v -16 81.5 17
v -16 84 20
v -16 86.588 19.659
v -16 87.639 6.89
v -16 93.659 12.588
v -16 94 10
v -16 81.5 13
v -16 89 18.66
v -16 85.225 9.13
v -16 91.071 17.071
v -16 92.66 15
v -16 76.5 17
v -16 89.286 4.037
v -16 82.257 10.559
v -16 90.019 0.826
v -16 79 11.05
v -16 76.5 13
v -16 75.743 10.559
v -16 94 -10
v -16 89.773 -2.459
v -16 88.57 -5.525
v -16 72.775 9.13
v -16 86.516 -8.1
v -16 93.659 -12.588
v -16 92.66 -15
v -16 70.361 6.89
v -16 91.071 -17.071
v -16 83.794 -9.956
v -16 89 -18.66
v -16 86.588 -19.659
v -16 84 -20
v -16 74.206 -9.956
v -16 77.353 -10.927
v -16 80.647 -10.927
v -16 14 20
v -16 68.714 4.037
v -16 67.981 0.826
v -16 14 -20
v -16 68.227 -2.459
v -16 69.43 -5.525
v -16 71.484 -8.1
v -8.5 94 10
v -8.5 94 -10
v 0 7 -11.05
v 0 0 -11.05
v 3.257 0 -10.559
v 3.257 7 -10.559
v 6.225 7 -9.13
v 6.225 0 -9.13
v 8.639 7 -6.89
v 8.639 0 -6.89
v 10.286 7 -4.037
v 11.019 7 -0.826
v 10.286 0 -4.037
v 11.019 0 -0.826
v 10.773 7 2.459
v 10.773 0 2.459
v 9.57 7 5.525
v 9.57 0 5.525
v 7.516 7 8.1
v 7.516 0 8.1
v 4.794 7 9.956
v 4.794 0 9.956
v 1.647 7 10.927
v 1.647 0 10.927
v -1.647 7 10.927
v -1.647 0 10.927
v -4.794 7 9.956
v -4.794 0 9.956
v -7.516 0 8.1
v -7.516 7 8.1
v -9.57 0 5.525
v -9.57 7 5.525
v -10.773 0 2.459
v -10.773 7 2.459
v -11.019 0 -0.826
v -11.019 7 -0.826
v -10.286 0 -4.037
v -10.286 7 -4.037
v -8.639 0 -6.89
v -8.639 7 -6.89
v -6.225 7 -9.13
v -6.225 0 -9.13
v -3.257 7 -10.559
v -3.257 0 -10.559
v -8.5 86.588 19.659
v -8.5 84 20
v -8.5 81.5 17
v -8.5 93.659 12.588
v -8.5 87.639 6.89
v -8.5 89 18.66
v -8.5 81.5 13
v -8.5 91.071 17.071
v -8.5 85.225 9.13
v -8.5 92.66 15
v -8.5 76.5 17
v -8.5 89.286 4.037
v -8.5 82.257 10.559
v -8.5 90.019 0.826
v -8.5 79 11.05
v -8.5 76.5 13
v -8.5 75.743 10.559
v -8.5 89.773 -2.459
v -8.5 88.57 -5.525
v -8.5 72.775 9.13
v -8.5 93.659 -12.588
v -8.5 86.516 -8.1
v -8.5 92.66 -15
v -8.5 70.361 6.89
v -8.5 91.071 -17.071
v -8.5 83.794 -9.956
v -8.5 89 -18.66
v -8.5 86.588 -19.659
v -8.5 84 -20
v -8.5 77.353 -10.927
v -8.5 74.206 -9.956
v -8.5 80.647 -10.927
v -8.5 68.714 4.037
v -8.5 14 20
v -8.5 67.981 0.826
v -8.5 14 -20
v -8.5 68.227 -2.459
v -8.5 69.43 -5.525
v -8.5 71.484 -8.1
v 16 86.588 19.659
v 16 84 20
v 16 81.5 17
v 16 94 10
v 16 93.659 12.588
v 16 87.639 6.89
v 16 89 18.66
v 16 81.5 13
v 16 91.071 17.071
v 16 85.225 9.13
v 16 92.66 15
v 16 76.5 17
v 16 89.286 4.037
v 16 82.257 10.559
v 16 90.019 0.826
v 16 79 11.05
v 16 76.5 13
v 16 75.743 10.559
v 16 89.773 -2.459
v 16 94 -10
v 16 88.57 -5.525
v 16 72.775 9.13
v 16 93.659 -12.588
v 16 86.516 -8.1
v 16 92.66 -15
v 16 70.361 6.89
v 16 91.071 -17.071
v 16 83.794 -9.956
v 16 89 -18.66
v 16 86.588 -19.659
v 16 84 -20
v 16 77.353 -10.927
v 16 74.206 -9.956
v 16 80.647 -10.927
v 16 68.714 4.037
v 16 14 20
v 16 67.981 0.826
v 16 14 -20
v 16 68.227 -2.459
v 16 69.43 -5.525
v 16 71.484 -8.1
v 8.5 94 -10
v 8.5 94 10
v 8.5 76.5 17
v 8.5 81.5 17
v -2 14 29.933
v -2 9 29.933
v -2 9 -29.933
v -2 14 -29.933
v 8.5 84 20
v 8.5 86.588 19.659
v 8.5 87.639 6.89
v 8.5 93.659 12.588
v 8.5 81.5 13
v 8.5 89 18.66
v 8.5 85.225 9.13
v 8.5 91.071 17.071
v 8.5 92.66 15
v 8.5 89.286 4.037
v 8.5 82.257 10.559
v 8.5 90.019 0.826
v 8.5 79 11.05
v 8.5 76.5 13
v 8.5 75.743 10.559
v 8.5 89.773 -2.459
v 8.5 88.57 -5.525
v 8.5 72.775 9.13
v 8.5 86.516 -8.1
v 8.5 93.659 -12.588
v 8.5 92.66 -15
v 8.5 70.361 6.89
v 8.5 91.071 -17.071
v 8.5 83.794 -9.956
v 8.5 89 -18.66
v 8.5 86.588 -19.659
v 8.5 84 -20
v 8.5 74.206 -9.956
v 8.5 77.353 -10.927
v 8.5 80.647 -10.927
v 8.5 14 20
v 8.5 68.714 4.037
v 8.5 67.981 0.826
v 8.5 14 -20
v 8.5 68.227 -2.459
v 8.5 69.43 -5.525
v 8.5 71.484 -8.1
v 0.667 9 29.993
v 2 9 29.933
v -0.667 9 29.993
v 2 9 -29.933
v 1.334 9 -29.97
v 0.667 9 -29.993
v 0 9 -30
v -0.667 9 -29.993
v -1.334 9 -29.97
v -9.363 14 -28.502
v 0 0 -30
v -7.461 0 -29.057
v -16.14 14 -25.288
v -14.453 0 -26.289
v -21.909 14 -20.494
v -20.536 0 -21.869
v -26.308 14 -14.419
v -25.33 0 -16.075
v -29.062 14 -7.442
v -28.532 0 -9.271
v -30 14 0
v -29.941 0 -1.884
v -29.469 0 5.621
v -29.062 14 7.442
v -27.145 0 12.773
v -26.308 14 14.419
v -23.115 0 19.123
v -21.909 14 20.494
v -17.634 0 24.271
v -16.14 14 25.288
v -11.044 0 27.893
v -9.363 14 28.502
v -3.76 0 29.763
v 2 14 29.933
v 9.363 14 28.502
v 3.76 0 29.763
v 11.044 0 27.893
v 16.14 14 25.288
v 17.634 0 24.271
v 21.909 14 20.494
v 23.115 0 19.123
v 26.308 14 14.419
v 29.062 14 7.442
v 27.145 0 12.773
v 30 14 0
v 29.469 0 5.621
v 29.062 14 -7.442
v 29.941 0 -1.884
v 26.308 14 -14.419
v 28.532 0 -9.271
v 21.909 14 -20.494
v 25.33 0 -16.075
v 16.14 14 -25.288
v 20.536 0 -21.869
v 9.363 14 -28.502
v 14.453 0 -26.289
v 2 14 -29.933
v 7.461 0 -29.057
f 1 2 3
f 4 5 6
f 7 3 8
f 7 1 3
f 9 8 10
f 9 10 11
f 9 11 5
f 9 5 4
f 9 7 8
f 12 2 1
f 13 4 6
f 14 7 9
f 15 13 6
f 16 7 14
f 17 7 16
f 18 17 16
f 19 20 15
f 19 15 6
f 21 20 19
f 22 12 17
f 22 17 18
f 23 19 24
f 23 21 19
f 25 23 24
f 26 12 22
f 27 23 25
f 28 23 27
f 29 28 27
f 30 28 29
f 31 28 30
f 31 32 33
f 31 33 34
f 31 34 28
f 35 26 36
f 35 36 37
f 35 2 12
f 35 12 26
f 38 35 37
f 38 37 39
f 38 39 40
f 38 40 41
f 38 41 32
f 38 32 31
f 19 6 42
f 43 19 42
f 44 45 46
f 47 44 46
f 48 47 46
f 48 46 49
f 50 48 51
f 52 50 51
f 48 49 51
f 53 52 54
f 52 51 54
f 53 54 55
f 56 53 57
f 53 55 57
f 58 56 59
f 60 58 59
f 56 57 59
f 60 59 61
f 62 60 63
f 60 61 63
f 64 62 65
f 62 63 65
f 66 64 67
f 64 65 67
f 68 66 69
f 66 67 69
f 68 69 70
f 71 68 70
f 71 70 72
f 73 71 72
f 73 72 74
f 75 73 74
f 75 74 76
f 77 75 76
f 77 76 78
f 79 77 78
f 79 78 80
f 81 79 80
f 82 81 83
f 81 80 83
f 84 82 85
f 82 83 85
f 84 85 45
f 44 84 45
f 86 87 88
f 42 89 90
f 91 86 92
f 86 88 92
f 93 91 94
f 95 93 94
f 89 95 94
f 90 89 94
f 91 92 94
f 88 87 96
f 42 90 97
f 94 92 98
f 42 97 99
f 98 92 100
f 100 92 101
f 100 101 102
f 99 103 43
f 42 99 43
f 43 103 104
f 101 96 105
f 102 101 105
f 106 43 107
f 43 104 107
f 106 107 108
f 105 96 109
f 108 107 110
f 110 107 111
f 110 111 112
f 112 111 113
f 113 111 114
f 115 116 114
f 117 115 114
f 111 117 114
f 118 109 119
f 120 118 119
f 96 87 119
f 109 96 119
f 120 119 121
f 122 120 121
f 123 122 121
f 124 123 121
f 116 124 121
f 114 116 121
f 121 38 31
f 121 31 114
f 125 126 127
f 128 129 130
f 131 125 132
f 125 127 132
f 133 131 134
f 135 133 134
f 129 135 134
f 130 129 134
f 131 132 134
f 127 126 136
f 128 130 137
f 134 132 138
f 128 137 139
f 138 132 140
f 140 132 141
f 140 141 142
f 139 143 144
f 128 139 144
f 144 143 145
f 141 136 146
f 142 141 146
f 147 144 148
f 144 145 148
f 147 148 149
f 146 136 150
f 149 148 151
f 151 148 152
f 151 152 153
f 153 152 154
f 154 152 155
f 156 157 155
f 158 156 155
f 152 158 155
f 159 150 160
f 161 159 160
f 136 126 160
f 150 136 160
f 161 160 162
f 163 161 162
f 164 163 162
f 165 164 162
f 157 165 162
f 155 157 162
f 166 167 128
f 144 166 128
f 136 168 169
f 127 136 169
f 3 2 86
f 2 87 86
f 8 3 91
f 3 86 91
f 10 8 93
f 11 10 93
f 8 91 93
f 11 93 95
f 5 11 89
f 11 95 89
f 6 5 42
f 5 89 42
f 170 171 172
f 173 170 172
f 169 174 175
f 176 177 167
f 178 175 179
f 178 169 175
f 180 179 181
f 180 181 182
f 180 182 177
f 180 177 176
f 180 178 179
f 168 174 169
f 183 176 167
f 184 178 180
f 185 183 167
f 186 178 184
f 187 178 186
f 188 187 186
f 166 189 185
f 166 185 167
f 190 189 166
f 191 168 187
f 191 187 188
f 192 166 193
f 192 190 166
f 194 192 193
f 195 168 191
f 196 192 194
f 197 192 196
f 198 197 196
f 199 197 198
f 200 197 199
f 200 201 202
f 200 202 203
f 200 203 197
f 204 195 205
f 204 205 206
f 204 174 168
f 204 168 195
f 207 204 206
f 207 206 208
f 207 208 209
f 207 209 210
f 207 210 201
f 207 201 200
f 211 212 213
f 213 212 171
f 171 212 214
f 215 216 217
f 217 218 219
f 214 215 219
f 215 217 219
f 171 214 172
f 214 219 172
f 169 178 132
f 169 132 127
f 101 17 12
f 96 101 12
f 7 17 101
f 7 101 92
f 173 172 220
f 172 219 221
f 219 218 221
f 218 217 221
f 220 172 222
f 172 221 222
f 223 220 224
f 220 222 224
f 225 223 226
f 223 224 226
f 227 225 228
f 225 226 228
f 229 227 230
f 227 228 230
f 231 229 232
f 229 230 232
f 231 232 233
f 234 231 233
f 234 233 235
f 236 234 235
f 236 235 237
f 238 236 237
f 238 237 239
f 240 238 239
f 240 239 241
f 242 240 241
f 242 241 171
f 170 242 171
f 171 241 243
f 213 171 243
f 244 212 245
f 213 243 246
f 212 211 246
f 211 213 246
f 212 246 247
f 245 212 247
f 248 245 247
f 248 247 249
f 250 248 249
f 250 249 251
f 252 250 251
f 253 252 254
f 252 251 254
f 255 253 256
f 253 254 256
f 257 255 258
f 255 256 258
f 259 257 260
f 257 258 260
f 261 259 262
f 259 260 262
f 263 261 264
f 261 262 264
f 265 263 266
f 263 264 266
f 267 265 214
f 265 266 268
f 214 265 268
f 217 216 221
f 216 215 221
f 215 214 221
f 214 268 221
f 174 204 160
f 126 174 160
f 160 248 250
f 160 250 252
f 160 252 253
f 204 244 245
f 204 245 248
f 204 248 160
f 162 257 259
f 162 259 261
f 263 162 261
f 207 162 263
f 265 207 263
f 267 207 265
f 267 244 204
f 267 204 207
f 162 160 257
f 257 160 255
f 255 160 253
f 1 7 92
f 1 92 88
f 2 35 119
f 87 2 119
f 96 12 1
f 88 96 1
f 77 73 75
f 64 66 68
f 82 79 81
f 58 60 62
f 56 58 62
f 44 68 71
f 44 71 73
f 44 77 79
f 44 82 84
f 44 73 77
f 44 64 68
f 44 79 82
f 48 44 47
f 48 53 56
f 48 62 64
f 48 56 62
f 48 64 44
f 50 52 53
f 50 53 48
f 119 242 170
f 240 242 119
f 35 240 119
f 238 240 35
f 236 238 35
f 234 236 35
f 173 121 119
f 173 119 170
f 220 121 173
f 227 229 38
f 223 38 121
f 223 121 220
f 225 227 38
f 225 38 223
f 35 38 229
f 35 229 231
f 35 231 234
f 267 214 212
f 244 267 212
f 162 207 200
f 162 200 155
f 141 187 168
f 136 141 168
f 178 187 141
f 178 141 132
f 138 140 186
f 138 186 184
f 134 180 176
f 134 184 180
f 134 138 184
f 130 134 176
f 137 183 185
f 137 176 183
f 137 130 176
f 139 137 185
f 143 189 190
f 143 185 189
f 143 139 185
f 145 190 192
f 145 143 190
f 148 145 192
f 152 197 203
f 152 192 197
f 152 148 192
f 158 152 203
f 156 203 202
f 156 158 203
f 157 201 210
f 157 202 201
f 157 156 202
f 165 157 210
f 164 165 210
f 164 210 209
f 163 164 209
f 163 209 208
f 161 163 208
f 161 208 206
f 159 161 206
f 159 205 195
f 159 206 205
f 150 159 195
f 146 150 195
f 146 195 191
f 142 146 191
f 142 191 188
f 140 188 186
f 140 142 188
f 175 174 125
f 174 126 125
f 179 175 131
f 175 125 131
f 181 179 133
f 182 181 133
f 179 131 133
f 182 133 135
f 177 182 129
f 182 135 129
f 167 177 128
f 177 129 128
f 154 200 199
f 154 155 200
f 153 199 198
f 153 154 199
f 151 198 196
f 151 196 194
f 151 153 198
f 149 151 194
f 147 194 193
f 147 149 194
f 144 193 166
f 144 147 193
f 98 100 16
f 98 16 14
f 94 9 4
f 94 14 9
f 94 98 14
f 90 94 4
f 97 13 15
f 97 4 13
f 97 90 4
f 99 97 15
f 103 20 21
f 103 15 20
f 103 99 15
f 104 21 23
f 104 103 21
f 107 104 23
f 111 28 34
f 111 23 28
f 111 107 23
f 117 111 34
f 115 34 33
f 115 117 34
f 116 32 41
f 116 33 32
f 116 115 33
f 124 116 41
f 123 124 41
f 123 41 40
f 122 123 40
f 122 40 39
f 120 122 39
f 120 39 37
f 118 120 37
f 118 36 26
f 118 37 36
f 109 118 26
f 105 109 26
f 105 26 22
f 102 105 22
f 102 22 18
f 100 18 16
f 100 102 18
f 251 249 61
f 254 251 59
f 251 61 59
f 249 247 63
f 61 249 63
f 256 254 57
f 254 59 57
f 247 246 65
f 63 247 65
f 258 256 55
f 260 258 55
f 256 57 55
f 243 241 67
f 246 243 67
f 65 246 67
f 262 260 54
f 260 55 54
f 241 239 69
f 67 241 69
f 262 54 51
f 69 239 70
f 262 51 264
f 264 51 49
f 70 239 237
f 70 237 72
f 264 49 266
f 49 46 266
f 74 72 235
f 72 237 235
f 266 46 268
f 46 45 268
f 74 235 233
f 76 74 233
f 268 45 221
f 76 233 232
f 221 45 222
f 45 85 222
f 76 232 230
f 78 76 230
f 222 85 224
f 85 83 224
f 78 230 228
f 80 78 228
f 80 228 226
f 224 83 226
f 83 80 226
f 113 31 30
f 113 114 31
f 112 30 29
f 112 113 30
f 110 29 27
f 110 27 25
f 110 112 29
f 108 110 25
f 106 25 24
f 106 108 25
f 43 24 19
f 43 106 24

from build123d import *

# Parameters (mm, degrees)
SKETCH1_R               = 30
BOSS_EXTRUDE1_DEPTH     = 14
SKETCH2_R               = 11.05
CUT_EXTRUDE1_DEPTH      = 7
SKETCH5_W               = 7.5
SKETCH5_H               = 40
BOSS_EXTRUDE2_DEPTH     = 80
FILLET1_R               = 10
CUT_EXTRUDE3_DEPTH      = 109.866891202
CUT_EXTRUDE3_DEPTH_BACK = 109.866891202
SKETCH7_R               = 11.05
CUT_EXTRUDE4_START      = -5
CUT_EXTRUDE4_DEPTH      = 5
CUT_EXTRUDE5_REACH      = 110.867
SKETCH9_W               = 4
SKETCH9_H               = 5


with BuildPart() as part:
    # Sketch1 → Boss-Extrude1 (new body)
    with BuildSketch(Plane(origin=(0, 0, 0), x_dir=(1, 0, 0), z_dir=(0, 1, 0))):
        with Locations(Location((0, 0, 0), (0, 0, 90))):
            Circle(SKETCH1_R)
    extrude(amount=BOSS_EXTRUDE1_DEPTH)

    # Sketch2 → Cut-Extrude1 (cut)
    with BuildSketch(Plane.XZ):
        with Locations(Location((0, 0, 0), (0, 0, 270))):
            Circle(SKETCH2_R)
    extrude(amount=-CUT_EXTRUDE1_DEPTH, mode=Mode.SUBTRACT)

    # Sketch5 → Boss-Extrude2 (add)
    with BuildSketch(Plane(origin=(0, 14, 0), x_dir=(1, 0, 0), z_dir=(0, 1, 0))):
        with Locations((-12.25, 0)):
            Rectangle(SKETCH5_W, SKETCH5_H)
        with Locations((12.25, 0)):
            Rectangle(SKETCH5_W, SKETCH5_H)
    extrude(amount=BOSS_EXTRUDE2_DEPTH)

    # Fillet1
    fillet1_edges = [part.edges().sort_by_distance(p)[0] for p in [
        (-12.25, 94, 20),
        (-12.25, 94, -20),
        (12.25, 94, 20),
        (12.25, 94, -20),
    ]]
    fillet(fillet1_edges, radius=FILLET1_R)

    # Sketch7 → Cut-Extrude3 (cut, two sides: drawn at the far end of the back side and taken through both)
    with BuildSketch(Plane.ZY.offset(16).offset(-CUT_EXTRUDE3_DEPTH_BACK)):
        with Locations((0, 79)):
            Circle(SKETCH7_R)
    extrude(amount=CUT_EXTRUDE3_DEPTH + CUT_EXTRUDE3_DEPTH_BACK, mode=Mode.SUBTRACT)

    # Sketch8 → Cut-Extrude4 (cut)
    with BuildSketch(Plane(origin=(0, 14, 0), x_dir=(1, 0, 0), z_dir=(0, 1, 0)).offset(CUT_EXTRUDE4_START)):
        with BuildLine():
            Line((2, 29.933259094), (2, -29.933259094))
            ThreePointArc((2, -29.933259094), (0, -30), (-2, -29.933259094))
            Line((-2, -29.933259094), (-2, 29.933259094))
            ThreePointArc((-2, 29.933259094), (0, 30), (2, 29.933259094))
        make_face()
    extrude(amount=CUT_EXTRUDE4_DEPTH, mode=Mode.SUBTRACT)

    # Cut-Extrude5: up to this face of the body (flat: up to its plane)
    cut_extrude5_end = Plane(part.part.faces().sort_by_distance((16, 49.957843981, 0))[0])
    # Sketch9 → Cut-Extrude5 (cut, up to the picked face)
    with BuildSketch(Plane.ZY.offset(16), mode=Mode.PRIVATE) as cut_extrude5_sk1:
        with Locations((15, 79)):
            Rectangle(SKETCH9_W, SKETCH9_H)
    cut_extrude5_tool1 = split(extrude(cut_extrude5_sk1.sketch, amount=-CUT_EXTRUDE5_REACH, mode=Mode.PRIVATE), bisect_by=cut_extrude5_end, keep=Keep.BOTH, mode=Mode.PRIVATE)
    add(cut_extrude5_tool1.solids().sort_by(Axis((-16, 79, 15), (1, 0, 0)))[0], mode=Mode.SUBTRACT)


solid = part.part
